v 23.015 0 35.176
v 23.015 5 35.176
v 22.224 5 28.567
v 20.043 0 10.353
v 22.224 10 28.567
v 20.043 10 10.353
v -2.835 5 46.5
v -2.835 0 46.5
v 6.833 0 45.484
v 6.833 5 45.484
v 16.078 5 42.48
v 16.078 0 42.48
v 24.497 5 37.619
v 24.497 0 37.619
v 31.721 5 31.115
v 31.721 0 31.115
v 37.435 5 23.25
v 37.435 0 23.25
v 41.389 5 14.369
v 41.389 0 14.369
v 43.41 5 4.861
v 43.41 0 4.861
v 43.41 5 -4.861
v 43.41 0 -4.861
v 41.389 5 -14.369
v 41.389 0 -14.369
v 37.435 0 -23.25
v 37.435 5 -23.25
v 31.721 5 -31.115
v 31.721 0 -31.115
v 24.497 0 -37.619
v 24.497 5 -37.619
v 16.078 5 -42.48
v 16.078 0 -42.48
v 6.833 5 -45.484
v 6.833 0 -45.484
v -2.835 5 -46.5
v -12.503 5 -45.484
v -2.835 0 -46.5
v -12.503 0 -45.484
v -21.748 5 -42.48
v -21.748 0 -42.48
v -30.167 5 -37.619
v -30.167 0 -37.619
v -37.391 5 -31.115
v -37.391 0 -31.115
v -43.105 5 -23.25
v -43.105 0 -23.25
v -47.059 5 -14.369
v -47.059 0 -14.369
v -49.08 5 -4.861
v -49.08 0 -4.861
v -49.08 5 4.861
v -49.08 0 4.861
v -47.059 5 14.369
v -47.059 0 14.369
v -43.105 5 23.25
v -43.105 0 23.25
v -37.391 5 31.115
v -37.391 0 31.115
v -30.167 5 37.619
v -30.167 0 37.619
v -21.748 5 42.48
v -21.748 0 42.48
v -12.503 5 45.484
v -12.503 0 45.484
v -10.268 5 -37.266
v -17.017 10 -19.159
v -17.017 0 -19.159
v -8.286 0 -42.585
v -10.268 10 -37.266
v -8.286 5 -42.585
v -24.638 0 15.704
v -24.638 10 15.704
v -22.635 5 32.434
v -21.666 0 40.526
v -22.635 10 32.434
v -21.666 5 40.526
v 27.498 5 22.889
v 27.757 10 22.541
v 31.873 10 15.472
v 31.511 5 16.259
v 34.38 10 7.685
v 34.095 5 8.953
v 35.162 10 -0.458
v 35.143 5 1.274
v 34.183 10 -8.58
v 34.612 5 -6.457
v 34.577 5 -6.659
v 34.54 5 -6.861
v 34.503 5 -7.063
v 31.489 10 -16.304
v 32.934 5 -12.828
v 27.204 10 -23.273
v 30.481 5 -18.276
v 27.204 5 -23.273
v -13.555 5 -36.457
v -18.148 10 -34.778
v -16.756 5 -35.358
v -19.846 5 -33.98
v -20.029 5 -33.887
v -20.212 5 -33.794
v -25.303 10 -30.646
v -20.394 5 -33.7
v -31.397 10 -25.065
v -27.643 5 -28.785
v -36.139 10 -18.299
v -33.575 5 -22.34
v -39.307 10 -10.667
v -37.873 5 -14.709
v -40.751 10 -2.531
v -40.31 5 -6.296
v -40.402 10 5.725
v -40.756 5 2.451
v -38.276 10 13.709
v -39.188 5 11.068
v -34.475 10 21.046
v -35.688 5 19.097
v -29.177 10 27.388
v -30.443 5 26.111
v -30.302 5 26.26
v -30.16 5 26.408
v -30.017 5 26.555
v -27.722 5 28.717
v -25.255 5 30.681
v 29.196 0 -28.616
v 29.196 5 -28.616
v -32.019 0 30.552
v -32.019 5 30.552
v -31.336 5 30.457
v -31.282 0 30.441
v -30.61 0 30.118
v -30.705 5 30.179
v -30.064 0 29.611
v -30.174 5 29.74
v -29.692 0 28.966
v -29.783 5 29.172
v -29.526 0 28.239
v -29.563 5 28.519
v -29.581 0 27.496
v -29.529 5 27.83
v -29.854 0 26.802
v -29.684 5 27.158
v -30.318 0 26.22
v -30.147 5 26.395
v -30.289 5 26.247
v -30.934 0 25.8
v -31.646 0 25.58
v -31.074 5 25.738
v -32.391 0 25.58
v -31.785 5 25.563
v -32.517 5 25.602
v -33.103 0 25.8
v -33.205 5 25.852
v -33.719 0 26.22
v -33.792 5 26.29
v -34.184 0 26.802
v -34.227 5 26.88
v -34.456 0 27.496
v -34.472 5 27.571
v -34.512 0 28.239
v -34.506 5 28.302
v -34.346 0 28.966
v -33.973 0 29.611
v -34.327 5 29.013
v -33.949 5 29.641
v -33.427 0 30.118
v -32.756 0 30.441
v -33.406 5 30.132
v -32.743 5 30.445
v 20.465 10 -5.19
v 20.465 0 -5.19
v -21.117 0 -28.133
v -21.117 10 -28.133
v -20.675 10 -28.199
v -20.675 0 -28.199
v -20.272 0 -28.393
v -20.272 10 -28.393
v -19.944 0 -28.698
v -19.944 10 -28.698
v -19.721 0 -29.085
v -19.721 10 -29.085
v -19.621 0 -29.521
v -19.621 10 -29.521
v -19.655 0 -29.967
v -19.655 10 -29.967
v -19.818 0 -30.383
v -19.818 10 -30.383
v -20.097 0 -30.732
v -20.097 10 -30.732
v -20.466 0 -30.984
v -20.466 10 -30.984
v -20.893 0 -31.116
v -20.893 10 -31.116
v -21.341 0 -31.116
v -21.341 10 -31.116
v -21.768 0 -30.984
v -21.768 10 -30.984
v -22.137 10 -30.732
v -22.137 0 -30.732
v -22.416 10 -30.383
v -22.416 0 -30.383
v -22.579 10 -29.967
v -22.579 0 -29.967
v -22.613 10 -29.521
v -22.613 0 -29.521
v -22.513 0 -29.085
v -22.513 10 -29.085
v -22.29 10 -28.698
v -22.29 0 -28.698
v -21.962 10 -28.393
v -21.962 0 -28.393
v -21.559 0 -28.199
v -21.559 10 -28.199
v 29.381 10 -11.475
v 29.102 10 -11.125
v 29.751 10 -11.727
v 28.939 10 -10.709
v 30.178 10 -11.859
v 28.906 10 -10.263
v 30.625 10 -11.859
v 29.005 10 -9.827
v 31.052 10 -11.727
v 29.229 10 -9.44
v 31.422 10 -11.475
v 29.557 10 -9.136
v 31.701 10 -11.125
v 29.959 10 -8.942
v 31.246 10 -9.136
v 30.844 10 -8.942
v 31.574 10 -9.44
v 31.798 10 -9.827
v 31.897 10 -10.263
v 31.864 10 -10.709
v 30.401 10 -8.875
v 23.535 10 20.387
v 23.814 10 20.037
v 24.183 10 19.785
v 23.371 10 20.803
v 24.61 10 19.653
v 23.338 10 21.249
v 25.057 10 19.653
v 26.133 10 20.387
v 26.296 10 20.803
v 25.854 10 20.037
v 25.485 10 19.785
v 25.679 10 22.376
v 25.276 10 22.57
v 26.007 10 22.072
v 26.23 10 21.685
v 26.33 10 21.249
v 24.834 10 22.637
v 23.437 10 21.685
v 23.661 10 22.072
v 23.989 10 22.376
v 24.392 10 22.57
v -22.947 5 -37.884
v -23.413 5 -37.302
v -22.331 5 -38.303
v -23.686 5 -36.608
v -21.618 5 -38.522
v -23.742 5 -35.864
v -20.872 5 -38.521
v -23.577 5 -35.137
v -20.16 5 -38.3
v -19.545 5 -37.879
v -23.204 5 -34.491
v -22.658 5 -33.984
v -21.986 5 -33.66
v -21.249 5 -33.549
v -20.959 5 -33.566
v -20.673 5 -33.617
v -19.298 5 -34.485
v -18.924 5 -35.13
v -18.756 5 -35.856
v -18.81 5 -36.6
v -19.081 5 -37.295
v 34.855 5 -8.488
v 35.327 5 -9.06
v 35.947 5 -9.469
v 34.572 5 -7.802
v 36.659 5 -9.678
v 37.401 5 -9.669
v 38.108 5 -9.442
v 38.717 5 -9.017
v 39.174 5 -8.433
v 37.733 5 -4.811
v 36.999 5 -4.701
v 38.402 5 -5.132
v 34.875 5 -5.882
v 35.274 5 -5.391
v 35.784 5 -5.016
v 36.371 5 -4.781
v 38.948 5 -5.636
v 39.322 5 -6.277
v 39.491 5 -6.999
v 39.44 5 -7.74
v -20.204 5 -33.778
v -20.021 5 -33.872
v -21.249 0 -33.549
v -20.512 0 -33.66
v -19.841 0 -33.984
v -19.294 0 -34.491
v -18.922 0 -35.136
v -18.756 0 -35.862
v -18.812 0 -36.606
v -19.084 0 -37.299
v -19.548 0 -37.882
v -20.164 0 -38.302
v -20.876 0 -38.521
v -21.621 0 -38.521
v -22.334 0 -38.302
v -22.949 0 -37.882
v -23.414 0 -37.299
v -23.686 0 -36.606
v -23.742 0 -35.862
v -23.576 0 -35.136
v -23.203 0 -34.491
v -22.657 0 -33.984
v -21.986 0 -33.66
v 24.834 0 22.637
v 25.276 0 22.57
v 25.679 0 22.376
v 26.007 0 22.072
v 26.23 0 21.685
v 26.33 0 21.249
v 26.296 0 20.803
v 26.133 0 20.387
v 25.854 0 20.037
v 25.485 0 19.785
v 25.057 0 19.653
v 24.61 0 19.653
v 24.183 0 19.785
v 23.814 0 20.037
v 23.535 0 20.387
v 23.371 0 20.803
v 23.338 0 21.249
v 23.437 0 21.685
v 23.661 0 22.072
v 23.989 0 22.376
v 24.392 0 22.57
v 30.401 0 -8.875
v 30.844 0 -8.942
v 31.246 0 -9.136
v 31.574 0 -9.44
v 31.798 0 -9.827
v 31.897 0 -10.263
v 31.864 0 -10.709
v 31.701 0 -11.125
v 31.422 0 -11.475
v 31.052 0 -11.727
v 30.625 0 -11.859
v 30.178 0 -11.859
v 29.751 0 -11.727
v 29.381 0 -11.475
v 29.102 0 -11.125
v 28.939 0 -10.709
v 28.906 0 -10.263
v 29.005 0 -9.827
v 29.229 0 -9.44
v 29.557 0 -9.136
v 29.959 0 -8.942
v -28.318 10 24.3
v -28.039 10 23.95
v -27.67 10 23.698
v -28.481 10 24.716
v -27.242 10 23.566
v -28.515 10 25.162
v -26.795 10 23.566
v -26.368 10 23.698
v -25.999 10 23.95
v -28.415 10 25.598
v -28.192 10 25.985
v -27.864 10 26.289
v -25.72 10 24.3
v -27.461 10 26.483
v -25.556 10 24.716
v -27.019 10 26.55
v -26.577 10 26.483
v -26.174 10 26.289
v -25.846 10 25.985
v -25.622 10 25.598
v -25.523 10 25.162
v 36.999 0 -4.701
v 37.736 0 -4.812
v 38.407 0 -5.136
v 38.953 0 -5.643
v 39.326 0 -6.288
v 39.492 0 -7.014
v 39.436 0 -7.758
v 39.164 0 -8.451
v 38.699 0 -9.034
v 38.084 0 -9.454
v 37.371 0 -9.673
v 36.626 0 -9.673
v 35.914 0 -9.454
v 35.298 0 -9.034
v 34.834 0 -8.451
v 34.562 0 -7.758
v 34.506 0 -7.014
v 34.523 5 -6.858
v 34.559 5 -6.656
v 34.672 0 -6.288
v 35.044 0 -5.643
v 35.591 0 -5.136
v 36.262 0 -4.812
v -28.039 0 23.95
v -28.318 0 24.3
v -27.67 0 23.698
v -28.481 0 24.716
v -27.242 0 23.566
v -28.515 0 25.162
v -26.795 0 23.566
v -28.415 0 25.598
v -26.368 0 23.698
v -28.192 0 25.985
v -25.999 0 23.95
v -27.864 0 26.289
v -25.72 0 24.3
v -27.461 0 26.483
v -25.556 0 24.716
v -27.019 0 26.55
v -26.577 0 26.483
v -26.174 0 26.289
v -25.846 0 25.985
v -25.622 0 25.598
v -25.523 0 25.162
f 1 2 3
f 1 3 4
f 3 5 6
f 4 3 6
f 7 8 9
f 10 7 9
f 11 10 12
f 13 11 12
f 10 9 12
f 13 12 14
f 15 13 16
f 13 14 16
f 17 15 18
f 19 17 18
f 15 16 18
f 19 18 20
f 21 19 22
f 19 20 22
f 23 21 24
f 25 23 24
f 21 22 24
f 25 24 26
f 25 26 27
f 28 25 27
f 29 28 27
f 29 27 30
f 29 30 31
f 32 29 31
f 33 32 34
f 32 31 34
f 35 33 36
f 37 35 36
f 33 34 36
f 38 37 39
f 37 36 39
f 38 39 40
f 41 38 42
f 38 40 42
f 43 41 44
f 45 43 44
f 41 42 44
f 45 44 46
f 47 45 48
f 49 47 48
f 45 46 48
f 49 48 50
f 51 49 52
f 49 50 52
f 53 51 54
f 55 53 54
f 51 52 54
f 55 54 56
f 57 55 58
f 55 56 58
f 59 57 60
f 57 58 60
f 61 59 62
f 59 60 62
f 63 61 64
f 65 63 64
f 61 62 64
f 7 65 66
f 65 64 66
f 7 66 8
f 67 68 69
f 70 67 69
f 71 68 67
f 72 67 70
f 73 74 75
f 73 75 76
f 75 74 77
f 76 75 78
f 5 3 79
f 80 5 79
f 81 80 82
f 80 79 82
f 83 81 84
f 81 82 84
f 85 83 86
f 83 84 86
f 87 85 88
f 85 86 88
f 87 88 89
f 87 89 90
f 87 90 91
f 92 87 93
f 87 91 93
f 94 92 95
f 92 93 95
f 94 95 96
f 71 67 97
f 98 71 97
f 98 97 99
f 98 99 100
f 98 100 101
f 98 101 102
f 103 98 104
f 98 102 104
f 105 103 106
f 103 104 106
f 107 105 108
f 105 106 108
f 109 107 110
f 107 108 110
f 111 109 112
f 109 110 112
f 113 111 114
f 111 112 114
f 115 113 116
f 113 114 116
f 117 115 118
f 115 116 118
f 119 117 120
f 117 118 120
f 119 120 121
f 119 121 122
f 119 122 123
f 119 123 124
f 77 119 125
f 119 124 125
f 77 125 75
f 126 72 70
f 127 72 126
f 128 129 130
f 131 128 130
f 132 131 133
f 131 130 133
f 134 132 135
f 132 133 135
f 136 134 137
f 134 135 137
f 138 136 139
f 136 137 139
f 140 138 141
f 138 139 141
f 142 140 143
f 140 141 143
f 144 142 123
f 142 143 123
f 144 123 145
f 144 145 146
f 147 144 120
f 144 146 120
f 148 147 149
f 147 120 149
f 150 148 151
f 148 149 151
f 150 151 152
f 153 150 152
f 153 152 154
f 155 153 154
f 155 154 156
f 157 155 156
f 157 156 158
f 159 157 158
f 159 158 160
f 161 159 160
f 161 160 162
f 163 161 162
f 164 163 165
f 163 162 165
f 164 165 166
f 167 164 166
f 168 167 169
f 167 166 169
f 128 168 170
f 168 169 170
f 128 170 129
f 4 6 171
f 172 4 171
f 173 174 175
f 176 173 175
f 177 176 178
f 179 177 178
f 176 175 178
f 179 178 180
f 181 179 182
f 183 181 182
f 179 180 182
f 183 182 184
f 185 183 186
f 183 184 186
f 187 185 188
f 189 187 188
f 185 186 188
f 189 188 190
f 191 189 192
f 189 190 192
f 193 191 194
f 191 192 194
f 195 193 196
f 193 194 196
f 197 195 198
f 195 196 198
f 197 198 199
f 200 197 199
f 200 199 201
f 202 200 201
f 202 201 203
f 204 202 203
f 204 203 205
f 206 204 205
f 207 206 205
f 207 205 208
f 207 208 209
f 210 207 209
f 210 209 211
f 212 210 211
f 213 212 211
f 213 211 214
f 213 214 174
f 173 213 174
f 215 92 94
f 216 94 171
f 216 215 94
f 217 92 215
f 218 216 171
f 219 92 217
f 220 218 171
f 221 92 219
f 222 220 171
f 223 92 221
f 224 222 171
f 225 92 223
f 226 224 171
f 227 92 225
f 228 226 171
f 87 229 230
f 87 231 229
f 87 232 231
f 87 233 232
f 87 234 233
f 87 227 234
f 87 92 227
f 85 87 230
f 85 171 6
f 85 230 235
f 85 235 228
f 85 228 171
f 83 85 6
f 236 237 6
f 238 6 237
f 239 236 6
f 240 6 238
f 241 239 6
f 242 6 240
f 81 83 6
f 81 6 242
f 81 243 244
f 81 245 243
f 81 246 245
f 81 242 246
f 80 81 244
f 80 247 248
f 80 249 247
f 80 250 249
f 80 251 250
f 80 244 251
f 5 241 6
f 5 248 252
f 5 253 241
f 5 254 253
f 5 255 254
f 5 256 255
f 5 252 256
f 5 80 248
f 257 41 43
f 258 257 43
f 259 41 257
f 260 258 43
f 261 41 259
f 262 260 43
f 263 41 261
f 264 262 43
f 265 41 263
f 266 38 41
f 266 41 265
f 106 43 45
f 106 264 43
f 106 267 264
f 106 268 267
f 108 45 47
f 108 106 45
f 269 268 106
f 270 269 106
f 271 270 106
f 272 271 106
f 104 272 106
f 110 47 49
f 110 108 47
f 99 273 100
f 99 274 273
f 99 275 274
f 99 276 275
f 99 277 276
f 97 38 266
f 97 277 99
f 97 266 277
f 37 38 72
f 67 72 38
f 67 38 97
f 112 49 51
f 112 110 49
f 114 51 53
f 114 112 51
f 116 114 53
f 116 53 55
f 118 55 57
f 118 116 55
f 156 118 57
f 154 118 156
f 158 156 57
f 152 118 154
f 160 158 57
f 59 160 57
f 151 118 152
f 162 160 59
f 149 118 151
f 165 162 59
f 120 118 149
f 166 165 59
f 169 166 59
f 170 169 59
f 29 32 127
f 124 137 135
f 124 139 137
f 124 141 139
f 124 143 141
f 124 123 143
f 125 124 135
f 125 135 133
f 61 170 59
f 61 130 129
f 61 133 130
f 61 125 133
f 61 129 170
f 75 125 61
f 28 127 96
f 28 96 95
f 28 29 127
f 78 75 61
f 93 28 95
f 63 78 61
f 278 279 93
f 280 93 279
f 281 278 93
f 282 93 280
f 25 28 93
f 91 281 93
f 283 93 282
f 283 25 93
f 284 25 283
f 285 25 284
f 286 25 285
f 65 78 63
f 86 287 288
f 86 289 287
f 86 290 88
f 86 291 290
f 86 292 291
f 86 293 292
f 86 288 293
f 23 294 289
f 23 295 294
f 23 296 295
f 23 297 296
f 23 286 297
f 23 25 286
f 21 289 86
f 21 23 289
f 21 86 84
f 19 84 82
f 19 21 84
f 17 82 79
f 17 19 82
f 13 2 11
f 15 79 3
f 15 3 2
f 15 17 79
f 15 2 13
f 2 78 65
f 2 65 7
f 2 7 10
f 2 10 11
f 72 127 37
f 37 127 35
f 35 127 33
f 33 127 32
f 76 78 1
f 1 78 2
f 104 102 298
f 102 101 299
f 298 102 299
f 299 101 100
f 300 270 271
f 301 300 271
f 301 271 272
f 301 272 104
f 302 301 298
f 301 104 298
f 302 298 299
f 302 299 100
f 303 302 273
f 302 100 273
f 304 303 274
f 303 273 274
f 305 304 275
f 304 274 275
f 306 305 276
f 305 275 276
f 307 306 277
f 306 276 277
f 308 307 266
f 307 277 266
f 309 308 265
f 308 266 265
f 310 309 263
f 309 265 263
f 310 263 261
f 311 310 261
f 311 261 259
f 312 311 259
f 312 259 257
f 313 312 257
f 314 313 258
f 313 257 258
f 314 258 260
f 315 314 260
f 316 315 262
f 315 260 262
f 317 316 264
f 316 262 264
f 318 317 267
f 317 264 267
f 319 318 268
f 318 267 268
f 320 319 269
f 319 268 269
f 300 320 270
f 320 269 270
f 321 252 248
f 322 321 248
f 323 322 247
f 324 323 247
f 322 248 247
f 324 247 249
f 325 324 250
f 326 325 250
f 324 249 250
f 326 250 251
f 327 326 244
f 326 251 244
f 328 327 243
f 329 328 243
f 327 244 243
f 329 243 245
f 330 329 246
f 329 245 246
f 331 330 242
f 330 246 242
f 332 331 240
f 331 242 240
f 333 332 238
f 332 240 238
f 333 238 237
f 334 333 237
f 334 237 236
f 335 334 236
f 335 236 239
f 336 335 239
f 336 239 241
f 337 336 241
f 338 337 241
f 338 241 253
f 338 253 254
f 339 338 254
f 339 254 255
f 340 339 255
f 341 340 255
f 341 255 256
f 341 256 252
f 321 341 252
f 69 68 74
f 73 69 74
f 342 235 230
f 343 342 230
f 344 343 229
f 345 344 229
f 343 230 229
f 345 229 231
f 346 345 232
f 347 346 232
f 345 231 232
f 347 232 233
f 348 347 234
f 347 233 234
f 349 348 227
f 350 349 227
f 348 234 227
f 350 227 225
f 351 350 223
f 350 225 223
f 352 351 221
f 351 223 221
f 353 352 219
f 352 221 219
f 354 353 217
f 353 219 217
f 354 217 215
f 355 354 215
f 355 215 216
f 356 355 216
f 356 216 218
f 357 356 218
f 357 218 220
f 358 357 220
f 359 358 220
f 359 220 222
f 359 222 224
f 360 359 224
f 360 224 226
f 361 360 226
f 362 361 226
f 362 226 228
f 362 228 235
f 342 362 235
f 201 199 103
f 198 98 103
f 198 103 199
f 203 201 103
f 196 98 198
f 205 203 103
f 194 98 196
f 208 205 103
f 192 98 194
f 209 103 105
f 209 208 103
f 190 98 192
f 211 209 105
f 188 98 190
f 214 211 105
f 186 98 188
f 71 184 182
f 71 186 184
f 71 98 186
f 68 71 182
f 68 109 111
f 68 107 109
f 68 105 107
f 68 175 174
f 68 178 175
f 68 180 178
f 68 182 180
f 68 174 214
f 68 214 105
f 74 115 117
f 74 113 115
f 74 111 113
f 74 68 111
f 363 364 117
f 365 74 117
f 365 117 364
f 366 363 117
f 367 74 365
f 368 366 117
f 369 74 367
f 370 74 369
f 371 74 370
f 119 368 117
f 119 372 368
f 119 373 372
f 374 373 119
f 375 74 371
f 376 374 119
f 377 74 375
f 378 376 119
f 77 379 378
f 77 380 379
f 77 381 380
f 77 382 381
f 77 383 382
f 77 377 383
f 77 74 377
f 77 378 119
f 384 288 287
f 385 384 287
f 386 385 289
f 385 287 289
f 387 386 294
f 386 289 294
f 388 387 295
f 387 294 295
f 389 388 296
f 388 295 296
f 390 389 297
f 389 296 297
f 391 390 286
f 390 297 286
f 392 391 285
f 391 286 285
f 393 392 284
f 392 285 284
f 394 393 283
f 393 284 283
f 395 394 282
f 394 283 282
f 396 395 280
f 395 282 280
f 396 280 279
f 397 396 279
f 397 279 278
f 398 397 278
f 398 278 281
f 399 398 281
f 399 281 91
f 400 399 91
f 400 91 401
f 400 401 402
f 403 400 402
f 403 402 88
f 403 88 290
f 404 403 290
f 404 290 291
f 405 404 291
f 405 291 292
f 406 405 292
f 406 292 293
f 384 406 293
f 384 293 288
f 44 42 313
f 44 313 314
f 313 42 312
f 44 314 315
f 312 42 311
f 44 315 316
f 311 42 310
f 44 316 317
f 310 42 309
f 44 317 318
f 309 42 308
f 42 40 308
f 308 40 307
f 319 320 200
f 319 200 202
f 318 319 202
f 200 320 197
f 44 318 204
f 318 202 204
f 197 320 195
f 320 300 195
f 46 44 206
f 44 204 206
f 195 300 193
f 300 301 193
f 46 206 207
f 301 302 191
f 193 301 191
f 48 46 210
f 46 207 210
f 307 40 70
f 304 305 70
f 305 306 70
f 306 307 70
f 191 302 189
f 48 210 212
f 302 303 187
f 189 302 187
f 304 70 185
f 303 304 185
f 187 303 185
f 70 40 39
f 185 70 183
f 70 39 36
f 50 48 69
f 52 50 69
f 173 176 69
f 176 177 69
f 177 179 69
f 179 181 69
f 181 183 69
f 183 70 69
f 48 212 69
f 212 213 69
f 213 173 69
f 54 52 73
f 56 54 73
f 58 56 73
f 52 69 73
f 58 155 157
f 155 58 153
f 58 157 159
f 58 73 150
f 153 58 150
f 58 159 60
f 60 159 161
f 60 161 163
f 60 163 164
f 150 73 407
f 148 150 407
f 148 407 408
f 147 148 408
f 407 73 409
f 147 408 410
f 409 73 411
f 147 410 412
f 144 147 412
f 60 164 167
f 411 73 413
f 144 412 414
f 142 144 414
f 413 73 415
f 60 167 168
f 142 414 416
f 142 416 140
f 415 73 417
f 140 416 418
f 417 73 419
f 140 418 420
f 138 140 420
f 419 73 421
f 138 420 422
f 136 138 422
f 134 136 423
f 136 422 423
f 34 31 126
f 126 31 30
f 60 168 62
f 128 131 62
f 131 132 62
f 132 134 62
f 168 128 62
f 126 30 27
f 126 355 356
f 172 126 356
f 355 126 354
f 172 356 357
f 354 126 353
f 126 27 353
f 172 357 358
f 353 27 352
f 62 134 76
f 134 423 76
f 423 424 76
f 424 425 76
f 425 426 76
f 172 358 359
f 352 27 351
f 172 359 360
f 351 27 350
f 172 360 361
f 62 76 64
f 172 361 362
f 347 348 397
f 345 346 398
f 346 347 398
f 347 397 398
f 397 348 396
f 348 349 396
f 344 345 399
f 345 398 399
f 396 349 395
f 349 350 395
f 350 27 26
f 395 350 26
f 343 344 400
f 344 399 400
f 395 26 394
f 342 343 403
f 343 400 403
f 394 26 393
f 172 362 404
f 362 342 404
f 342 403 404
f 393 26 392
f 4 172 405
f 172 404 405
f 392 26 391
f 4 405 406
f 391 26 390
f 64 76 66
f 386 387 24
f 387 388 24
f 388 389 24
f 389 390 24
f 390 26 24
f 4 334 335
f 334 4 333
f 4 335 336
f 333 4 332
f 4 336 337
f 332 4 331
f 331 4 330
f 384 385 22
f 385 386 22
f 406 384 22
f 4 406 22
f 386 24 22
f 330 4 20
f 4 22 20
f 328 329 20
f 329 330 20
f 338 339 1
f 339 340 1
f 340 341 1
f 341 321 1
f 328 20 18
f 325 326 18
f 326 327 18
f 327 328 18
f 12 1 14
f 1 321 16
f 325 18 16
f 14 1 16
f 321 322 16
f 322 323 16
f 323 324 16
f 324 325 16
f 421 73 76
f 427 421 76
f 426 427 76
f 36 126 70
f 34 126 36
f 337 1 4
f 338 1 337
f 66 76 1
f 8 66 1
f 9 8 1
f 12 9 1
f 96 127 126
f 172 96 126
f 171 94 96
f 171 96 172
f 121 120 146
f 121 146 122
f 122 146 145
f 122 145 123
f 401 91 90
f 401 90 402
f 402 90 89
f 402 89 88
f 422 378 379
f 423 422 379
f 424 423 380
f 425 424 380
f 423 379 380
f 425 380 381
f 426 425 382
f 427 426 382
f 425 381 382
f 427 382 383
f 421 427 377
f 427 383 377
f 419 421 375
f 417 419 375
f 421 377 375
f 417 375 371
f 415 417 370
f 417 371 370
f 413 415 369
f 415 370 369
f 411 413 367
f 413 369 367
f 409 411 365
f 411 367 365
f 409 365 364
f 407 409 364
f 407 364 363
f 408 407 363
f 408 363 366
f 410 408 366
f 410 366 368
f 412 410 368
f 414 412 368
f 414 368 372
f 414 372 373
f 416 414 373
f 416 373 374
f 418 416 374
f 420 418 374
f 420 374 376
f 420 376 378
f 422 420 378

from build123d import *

# Parameters (mm, degrees)
ESQUISSE1_R             = 46.5
BOSS_EXTRU_1_DEPTH      = 5
ESQUISSE3_R             = 38
BOSS_EXTRU_2_DEPTH      = 5
ESQUISSE4_R             = 2.5
ENL_V_MAT_EXTRU_1_DEPTH = 6
ESQUISSE5_R             = 1.5
ENL_V_MAT_EXTRU_2_DEPTH = 11
ENL_V_MAT_EXTRU_4_DEPTH = 11
ENL_V_MAT_EXTRU_5_DEPTH = 11
ENL_V_MAT_EXTRU_6_DEPTH = 11


with BuildPart() as part:
    # Esquisse1 → Boss.-Extru.1 (new body)
    with BuildSketch(Plane(origin=(0, 0, 0), x_dir=(1, 0, 0), z_dir=(0, 1, 0))):
        with Locations(Location((-2.835211314, 0, 0), (0, 0, 270))):  # turned: the seam where the file's is
            Circle(ESQUISSE1_R)
    extrude(amount=BOSS_EXTRU_1_DEPTH)

    # Esquisse3 → Boss.-Extru.2 (add)
    with BuildSketch(Plane(origin=(0, 5, 0), x_dir=(1, 0, 0), z_dir=(0, 1, 0))):
        with Locations(Location((-2.835211314, 0, 0), (0, 0, 270))):  # turned: the seam where the file's is
            Circle(ESQUISSE3_R)
    extrude(amount=BOSS_EXTRU_2_DEPTH)

    # Esquisse4 → Enlèv. mat.-Extru.1 (cut, through all)
    with BuildSketch(Plane(origin=(0, 5, 0), x_dir=(1, 0, 0), z_dir=(0, 1, 0))):
        with Locations(Location((-21.248861584, 36.049258979, 0), (0, 0, 270))):  # turned: the seam where the file's is
            Circle(ESQUISSE4_R)
        with Locations(Location((36.99885245, 7.201316076, 0), (0, 0, 270))):  # turned: the seam where the file's is
            Circle(ESQUISSE4_R)
        with Locations(Location((-32.01877618, -28.052292793, 0), (0, 0, 270))):  # turned: the seam where the file's is
            Circle(ESQUISSE4_R)
    extrude(amount=-ENL_V_MAT_EXTRU_1_DEPTH, mode=Mode.SUBTRACT)

    # Esquisse5 → Enlèv. mat.-Extru.2 (cut, through all)
    with BuildSketch(Plane(origin=(0, 10, 0), x_dir=(1, 0, 0), z_dir=(0, 1, 0))):
        with Locations(Location((-27.01877618, -25.04959308, 0), (0, 0, 270))):  # turned: the seam where the file's is
            Circle(ESQUISSE5_R)
        with Locations(Location((24.833784646, -21.136546209, 0), (0, 0, 270))):  # turned: the seam where the file's is
            Circle(ESQUISSE5_R)
        with Locations(Location((30.401495955, 10.375365678, 0), (0, 0, 270))):  # turned: the seam where the file's is
            Circle(ESQUISSE5_R)
        with Locations(Location((-21.116944618, 29.632839055, 0), (0, 0, 270))):  # turned: the seam where the file's is
            Circle(ESQUISSE5_R)
    extrude(amount=-ENL_V_MAT_EXTRU_2_DEPTH, mode=Mode.SUBTRACT)

    # Esquisse6 → Enlèv. mat.-Extru.4 (cut, through all)
    with BuildSketch(Plane(origin=(0, 10, 0), x_dir=(1, 0, 0), z_dir=(0, 1, 0))):
        Polygon((-17.016589785, 19.158599311), (-8.28612786, 42.584632577), (29.195500656, 28.615902705), (20.465038731, 5.189869439), align=None)
    extrude(amount=-ENL_V_MAT_EXTRU_4_DEPTH, mode=Mode.SUBTRACT)

    # Esquisse7 → Enlèv. mat.-Extru.5 (cut, through all)
    with BuildSketch(Plane(origin=(0, 10, 0), x_dir=(1, 0, 0), z_dir=(0, 1, 0))):
        Polygon((-24.638086397, -15.703679396), (-21.665671556, -40.526345449), (23.01512734, -35.175998737), (20.0427125, -10.353332683), align=None)
    extrude(amount=-ENL_V_MAT_EXTRU_5_DEPTH, mode=Mode.SUBTRACT)

    # Esquisse8 → Enlèv. mat.-Extru.6 (cut, through all)
    with BuildSketch(Plane(origin=(0, 10, 0), x_dir=(1, 0, 0), z_dir=(0, 1, 0))):
        Polygon((-17.016589785, 19.158599311), (-24.638086397, -15.703679396), (20.0427125, -10.353332683), (20.465038731, 5.189869439), align=None)
    extrude(amount=-ENL_V_MAT_EXTRU_6_DEPTH, mode=Mode.SUBTRACT)


solid = part.part
